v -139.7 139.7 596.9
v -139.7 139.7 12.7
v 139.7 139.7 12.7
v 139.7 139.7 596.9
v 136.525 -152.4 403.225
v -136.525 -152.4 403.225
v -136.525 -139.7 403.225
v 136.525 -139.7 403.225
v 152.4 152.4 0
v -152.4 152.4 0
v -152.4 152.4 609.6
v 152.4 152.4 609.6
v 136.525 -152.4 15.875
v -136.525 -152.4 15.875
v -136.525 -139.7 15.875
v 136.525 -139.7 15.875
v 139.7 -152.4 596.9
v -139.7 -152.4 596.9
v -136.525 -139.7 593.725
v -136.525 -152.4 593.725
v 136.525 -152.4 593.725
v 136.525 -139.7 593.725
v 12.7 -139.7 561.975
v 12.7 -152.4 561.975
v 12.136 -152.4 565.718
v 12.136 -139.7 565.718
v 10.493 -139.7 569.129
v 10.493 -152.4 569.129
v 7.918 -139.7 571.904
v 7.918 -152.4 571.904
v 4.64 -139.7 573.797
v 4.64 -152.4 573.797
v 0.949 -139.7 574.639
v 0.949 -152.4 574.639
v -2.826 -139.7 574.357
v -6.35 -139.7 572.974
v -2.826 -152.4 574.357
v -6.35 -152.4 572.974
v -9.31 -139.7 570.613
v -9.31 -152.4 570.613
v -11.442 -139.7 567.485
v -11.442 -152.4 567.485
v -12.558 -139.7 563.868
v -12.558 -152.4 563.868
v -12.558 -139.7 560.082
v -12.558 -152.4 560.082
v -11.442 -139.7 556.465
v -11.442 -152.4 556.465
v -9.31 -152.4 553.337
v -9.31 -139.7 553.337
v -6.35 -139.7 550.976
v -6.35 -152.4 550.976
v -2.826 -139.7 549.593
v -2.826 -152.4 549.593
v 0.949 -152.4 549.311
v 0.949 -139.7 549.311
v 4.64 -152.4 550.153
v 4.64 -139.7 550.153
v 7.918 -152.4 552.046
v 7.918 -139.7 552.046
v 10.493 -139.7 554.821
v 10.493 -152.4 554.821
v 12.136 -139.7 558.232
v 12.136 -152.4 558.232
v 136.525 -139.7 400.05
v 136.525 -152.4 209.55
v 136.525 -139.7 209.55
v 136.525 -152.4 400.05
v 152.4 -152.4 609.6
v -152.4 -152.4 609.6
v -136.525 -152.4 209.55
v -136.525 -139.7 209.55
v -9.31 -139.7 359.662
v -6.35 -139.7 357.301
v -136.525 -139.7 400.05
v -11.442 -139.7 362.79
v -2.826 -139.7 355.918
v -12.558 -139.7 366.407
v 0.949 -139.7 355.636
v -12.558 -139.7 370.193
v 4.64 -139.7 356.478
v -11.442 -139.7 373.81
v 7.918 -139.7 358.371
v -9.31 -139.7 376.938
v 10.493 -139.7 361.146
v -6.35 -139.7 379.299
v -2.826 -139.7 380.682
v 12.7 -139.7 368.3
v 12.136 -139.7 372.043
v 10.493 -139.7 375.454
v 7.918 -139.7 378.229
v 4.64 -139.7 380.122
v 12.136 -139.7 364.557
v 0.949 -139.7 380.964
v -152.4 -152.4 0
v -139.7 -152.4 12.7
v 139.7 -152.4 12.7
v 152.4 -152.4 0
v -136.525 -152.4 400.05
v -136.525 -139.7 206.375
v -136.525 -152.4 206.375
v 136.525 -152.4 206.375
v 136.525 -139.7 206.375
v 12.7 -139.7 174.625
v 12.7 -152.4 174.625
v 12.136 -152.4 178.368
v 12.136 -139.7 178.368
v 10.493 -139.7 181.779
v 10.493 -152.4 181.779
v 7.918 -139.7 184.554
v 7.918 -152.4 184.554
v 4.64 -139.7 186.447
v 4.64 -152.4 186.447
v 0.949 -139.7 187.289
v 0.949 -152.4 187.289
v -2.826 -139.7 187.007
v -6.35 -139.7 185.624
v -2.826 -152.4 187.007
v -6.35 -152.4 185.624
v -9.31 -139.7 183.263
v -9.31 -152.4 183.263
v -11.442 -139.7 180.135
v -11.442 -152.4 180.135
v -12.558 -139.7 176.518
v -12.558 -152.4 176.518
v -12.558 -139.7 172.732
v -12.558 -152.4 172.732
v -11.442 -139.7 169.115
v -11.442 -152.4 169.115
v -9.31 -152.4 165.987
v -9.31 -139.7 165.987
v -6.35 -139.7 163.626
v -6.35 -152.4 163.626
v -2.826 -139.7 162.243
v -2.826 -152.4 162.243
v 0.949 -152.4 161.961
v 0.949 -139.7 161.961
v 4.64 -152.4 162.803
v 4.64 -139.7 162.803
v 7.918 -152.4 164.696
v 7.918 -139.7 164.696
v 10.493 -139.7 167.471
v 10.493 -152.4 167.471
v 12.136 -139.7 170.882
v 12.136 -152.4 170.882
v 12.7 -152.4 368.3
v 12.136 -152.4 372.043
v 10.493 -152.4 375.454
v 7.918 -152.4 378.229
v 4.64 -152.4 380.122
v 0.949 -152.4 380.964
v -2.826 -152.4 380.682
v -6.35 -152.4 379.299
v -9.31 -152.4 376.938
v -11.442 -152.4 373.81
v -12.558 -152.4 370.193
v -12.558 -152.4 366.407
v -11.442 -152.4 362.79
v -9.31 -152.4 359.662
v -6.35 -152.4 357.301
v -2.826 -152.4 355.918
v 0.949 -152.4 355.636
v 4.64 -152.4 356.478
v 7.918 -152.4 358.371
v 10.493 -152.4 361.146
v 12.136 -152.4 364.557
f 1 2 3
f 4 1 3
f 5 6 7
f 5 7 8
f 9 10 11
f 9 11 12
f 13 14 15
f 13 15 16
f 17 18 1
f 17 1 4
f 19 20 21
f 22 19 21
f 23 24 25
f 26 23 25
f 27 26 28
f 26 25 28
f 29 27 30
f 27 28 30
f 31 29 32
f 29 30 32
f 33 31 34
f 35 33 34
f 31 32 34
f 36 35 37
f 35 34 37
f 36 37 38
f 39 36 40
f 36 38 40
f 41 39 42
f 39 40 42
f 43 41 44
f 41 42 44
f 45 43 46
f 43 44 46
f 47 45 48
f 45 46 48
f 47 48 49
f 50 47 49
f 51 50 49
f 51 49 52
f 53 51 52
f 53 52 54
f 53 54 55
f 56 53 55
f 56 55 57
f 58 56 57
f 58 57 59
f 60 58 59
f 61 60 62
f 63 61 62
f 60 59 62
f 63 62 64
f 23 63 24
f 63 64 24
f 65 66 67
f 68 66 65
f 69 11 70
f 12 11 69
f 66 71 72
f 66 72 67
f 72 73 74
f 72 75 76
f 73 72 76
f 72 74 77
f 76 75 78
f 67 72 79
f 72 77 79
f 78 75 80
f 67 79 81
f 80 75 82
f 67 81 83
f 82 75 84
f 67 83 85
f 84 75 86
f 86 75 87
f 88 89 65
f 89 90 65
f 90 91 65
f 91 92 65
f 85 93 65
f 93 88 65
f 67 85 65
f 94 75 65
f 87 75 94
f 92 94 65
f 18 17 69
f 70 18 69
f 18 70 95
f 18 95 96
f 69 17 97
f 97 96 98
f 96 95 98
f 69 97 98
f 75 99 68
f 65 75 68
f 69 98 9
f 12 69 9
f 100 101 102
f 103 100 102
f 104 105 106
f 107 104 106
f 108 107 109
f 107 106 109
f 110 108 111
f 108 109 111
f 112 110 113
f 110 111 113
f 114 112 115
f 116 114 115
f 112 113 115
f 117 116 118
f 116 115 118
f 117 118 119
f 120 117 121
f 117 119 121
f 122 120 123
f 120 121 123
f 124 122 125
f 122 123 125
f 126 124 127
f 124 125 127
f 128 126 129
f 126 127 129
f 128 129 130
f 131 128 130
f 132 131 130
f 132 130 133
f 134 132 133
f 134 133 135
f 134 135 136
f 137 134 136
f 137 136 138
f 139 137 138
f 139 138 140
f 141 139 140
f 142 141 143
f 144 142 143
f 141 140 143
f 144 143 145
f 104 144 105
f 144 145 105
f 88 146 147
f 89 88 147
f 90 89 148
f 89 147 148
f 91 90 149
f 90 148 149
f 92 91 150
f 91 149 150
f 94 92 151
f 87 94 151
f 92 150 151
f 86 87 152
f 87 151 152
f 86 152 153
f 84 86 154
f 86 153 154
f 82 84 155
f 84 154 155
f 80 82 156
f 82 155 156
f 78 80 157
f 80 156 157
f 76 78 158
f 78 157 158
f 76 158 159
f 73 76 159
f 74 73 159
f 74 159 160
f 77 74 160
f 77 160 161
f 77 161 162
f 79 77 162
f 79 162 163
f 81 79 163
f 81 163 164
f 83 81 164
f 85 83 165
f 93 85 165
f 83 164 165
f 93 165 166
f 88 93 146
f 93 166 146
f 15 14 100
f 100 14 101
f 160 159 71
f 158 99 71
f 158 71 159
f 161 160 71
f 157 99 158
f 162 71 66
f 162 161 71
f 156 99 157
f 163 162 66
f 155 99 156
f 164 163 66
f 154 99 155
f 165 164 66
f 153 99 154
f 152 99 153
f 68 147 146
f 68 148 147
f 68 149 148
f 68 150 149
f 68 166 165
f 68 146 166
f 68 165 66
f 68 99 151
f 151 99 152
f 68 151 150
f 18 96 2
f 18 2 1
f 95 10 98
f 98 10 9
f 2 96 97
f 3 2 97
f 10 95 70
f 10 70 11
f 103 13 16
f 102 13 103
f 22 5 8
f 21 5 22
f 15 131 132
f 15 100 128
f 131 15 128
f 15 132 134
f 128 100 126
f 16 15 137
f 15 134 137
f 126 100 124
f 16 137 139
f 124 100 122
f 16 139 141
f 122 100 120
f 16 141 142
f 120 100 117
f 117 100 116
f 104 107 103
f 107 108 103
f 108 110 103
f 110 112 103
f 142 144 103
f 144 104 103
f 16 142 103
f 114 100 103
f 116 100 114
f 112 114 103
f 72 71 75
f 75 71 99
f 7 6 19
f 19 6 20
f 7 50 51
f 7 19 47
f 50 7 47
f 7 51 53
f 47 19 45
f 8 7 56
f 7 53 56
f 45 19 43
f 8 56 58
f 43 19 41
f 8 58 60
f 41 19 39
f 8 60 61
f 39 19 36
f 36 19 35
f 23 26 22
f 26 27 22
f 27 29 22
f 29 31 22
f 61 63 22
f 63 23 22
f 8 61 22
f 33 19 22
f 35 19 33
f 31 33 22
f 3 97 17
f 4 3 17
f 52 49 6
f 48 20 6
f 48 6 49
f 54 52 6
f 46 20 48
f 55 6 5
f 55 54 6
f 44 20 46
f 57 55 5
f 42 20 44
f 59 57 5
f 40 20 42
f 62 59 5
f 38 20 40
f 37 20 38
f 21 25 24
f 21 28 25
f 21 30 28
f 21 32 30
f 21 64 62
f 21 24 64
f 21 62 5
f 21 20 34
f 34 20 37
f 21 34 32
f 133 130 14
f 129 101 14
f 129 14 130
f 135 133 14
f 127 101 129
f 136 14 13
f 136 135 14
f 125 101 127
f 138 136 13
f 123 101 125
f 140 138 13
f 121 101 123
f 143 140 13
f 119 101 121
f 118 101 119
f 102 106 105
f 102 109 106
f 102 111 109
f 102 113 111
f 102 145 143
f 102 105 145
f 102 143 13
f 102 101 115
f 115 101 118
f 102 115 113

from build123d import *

# Parameters (mm, degrees)
F3_W     = 304.8
F3_H     = 304.8
F4_DEPTH = 609.6
F5_W     = 279.4
F5_H     = 584.2
F6_DEPTH = 292.1
F8_W     = 273.05
F8_H     = 190.5
F8_R     = 12.7
F9_DEPTH = 12.7


# Not quite as in the source:
# - a length typed as a fraction of an inch, garbled in the dataset ("3 / 203.2 mm" for 3/8 in), is restored
# - a feature names something its author has since deleted; it is built from what else it names


with BuildPart() as f4:
    # F3 (on Top) → F4 (new body)
    with BuildSketch(Plane.XY):
        Rectangle(F3_W, F3_H)
    extrude(amount=F4_DEPTH)

    # F5 (on face) → F6 (cut)
    with BuildSketch(Plane.XZ.offset(152.4)):
        with Locations((0, 304.8)):
            Rectangle(F5_W, F5_H)
    extrude(amount=-F6_DEPTH, mode=Mode.SUBTRACT)


with BuildPart() as f9:
    # F8 (on offset) → F9 (new body)
    with BuildSketch(Plane.XZ.offset(152.4)):
        with Locations((0, 498.475)):
            Rectangle(F8_W, F8_H)
        with Locations((0, 561.975)):
            Circle(F8_R, mode=Mode.SUBTRACT)
    extrude(amount=-F9_DEPTH)


with BuildPart() as f9b:
    # F8 (on offset) → F9, piece 2 (new body)
    with BuildSketch(Plane.XZ.offset(152.4)):
        with Locations((0, 304.8)):
            Rectangle(F8_W, F8_H)
        with Locations((0, 368.3)):
            Circle(F8_R, mode=Mode.SUBTRACT)
    extrude(amount=-F9_DEPTH)


with BuildPart() as f9c:
    # F8 (on offset) → F9, piece 3 (new body)
    with BuildSketch(Plane.XZ.offset(152.4)):
        with Locations((0, 111.125)):
            Rectangle(F8_W, F8_H)
        with Locations((0, 174.625)):
            Circle(F8_R, mode=Mode.SUBTRACT)
    extrude(amount=-F9_DEPTH)


solid = Compound([f4.part, f9.part, f9b.part, f9c.part])
